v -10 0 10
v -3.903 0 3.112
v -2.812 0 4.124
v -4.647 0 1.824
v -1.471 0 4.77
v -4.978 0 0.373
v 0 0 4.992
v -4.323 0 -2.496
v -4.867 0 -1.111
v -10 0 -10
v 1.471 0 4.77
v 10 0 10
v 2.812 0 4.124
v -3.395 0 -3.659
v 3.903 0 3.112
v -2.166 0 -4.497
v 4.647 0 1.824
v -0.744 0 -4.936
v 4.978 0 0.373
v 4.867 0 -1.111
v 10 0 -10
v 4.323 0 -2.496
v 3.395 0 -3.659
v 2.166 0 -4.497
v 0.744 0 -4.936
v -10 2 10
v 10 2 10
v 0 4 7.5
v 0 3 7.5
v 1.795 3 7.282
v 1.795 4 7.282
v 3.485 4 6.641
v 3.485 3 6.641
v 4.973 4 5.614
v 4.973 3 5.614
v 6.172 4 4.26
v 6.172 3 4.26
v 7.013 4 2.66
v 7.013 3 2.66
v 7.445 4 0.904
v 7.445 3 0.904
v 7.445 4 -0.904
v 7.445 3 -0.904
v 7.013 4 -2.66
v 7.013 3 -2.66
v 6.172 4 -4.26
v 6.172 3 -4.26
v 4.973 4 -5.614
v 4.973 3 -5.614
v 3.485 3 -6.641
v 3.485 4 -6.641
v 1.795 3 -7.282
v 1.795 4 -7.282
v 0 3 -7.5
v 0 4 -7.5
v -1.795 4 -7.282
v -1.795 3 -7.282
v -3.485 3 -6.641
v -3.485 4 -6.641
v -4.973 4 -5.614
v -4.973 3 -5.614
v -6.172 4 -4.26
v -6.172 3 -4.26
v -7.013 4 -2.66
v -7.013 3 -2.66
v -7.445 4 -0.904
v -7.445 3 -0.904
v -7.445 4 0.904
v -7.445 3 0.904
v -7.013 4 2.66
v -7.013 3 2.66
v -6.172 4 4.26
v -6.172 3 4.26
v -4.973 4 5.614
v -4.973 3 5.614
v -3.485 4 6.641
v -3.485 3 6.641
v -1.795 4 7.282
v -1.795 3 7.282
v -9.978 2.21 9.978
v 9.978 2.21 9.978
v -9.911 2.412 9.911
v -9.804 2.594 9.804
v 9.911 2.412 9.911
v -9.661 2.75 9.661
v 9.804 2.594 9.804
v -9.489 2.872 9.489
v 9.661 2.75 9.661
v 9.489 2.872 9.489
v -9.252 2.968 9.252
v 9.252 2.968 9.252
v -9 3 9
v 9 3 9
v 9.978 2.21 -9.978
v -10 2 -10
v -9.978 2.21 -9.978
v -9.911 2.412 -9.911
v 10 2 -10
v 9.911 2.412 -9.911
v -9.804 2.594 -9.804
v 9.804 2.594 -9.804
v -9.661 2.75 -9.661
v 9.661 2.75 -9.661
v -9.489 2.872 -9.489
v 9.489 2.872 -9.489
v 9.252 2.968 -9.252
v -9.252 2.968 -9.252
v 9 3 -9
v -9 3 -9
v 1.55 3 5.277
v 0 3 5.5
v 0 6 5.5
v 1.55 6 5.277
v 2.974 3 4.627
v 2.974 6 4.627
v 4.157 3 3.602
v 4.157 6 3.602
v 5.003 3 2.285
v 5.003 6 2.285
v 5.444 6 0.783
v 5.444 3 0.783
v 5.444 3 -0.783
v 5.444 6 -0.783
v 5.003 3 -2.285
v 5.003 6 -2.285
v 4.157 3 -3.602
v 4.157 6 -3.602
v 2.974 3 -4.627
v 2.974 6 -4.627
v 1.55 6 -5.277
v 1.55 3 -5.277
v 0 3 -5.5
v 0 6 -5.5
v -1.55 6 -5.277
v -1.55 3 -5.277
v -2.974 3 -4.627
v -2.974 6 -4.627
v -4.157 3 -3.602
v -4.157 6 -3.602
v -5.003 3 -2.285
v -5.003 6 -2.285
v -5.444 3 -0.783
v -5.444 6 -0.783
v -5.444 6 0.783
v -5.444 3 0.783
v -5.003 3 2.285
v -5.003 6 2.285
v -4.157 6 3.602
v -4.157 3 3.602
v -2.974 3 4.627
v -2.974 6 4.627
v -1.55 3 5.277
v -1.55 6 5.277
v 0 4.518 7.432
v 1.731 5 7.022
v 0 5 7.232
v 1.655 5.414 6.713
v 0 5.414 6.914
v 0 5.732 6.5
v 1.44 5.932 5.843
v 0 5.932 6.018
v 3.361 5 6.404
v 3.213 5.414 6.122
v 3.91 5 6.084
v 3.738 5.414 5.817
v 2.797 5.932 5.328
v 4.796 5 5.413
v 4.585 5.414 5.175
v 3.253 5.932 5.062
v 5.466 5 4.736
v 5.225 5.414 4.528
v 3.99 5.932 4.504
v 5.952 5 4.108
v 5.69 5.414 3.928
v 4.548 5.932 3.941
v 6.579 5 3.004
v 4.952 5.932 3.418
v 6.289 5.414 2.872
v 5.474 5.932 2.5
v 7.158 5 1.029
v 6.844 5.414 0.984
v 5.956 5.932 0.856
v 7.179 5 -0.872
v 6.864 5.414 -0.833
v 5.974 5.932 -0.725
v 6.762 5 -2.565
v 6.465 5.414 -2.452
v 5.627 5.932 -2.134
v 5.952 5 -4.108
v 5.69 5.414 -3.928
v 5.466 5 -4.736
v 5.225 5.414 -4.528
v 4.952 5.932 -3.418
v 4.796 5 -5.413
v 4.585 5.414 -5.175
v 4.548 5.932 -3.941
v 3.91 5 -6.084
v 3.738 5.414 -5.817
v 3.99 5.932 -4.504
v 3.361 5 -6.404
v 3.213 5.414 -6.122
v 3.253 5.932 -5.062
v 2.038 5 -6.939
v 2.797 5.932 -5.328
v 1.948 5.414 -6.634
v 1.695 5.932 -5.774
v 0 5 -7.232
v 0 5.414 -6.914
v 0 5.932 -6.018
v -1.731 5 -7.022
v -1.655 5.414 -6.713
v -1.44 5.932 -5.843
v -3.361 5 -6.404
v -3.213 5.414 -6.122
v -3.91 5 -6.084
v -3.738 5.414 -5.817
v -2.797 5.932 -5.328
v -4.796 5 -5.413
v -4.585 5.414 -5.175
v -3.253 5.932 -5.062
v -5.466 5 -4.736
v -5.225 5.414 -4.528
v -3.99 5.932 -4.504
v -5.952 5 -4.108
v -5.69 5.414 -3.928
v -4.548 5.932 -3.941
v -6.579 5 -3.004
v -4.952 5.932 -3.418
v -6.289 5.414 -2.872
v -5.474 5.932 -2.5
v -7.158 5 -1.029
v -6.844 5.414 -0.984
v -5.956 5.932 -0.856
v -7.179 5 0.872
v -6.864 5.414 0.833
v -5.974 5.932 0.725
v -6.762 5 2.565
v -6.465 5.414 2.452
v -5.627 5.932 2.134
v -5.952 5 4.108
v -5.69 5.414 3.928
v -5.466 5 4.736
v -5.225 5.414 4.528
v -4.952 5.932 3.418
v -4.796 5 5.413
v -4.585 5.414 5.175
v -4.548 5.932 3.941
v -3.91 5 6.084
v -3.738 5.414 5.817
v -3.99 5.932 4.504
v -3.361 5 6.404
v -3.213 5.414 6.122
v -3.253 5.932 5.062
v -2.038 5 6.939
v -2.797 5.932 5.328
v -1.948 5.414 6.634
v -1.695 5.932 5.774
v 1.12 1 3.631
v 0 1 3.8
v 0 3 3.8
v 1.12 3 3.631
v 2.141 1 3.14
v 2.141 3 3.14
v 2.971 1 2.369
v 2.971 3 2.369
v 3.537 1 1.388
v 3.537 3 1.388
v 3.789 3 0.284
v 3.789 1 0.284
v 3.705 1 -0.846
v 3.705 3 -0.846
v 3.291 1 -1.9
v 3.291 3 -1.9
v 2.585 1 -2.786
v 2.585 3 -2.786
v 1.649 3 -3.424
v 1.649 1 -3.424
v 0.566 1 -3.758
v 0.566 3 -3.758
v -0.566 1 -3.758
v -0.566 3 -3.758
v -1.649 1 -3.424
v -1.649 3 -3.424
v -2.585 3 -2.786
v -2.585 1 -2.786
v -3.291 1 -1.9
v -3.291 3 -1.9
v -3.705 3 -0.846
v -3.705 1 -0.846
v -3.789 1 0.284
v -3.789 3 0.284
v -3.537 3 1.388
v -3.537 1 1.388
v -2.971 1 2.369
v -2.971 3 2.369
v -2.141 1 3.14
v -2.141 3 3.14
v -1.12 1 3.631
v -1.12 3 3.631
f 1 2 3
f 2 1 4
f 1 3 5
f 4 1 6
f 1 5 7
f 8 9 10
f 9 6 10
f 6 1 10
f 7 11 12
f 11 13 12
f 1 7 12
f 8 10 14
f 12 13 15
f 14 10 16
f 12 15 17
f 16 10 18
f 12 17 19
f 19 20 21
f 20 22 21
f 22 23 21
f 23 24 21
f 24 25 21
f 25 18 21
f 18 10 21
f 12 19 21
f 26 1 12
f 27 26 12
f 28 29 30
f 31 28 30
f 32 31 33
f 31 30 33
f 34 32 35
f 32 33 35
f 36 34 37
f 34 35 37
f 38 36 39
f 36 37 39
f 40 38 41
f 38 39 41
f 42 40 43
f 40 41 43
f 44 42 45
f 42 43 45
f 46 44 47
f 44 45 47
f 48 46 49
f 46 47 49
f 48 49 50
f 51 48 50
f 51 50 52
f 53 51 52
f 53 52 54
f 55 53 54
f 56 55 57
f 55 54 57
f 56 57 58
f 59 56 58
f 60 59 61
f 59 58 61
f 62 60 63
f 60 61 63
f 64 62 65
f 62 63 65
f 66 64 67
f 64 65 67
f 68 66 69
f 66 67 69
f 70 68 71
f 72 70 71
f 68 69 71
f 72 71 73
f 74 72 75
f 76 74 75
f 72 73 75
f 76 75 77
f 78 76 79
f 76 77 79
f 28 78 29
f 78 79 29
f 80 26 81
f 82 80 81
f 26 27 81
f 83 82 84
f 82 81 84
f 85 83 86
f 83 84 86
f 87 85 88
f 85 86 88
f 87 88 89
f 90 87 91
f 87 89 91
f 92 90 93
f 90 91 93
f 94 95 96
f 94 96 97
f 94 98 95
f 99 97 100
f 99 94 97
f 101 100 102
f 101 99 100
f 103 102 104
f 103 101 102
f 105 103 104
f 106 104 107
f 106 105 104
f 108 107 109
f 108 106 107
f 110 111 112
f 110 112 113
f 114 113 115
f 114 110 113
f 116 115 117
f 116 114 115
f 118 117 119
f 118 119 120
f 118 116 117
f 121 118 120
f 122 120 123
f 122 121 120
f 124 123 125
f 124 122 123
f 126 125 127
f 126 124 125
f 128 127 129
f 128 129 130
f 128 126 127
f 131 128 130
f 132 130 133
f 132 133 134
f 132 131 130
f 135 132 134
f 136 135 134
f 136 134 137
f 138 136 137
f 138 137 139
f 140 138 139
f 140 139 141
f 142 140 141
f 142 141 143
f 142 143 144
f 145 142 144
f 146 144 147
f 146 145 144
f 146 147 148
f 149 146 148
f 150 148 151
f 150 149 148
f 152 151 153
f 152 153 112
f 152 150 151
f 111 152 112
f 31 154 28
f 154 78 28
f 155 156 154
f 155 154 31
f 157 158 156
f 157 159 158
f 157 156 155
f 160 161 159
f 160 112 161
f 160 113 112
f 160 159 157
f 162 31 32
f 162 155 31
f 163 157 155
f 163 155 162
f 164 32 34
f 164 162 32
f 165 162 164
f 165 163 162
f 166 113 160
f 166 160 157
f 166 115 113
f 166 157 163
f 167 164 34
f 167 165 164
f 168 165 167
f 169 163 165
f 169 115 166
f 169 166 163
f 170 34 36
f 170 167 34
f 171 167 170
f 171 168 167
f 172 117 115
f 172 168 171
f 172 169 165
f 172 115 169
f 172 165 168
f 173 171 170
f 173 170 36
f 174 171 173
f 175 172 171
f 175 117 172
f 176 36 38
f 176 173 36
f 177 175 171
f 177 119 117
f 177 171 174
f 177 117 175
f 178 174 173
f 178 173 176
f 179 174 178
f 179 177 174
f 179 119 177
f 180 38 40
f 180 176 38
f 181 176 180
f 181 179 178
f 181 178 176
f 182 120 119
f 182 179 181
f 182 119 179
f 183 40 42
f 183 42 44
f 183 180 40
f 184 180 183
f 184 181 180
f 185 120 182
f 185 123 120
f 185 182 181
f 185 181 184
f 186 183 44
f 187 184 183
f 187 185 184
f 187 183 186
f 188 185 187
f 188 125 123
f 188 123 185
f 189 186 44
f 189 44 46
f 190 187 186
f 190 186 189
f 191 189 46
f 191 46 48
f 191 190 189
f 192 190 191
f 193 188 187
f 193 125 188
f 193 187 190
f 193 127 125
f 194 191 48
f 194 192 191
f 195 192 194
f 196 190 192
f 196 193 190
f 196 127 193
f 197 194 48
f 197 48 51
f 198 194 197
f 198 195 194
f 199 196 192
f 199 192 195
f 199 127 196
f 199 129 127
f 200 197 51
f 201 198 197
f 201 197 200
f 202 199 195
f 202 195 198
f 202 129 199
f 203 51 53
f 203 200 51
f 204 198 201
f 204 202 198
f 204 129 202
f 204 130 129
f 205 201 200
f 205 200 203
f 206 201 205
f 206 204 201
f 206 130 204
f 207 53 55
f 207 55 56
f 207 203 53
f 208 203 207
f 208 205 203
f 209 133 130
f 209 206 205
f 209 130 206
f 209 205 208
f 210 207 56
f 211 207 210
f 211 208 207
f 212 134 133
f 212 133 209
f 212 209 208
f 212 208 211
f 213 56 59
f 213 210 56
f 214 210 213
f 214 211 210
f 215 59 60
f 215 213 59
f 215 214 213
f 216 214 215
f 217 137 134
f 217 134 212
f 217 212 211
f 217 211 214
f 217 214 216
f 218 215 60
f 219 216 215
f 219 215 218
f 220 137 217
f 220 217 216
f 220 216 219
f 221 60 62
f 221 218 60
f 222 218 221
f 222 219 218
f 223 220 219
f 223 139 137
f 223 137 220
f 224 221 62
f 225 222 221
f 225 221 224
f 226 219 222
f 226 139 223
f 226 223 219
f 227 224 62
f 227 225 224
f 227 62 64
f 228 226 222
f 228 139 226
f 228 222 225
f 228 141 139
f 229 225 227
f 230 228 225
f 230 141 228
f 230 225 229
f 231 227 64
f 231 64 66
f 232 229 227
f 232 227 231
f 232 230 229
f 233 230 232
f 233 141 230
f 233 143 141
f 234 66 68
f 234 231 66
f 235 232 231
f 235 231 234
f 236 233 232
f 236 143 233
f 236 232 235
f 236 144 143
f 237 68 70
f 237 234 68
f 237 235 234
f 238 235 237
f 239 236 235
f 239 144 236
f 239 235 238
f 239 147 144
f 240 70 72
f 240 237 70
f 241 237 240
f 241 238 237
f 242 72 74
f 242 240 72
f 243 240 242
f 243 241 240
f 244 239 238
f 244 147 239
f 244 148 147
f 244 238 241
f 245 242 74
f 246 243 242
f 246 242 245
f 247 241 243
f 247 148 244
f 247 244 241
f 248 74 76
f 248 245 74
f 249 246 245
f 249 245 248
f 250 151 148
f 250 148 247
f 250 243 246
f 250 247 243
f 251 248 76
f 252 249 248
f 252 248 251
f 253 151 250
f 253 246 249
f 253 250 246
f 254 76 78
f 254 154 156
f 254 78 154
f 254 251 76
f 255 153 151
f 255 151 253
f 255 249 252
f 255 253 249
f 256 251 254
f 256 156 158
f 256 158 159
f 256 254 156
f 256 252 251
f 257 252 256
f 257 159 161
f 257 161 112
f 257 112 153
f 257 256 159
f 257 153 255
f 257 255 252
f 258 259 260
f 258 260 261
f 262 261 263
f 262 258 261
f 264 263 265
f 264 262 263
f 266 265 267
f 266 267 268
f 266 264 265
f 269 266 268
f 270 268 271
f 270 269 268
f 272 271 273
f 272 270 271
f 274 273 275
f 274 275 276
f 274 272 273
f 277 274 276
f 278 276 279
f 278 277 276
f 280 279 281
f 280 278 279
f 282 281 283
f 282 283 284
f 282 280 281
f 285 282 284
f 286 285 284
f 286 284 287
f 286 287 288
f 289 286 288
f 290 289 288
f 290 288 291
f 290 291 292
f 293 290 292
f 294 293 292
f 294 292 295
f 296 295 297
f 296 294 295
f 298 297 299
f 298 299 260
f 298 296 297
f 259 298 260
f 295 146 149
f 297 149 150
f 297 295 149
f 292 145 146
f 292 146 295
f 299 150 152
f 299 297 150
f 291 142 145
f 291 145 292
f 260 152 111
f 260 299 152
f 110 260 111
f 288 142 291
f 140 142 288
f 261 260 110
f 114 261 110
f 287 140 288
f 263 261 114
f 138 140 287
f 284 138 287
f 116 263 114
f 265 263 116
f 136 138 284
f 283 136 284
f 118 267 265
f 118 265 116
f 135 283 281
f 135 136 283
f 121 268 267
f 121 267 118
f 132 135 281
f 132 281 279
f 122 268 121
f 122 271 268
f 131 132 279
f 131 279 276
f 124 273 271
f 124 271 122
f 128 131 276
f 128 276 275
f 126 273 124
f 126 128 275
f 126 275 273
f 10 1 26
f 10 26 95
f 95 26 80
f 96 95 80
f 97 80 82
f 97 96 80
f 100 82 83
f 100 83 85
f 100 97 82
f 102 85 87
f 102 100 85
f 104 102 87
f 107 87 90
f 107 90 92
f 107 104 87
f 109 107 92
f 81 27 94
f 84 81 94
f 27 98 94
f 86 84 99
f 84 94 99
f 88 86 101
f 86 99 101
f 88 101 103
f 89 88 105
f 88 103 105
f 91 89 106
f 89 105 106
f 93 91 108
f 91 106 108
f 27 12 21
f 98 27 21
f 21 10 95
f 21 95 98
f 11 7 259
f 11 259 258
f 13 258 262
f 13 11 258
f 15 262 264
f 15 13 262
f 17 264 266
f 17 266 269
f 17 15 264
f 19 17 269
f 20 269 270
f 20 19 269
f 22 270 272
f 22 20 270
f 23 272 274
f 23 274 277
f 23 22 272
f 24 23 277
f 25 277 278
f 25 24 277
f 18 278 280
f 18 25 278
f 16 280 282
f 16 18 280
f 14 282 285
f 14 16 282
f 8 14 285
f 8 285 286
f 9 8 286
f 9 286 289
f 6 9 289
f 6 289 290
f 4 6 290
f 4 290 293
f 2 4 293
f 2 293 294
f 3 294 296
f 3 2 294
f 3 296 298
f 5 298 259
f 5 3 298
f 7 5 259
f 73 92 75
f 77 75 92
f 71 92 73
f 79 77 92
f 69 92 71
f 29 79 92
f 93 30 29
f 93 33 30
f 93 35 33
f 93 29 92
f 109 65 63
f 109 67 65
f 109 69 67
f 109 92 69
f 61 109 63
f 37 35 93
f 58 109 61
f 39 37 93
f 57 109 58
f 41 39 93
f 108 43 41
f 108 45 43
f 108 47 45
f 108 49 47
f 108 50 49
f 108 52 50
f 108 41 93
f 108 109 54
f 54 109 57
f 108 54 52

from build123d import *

# Parameters (mm, degrees)
SKETCH1_W           = 20
SKETCH1_H           = 20
SKETCH1_R           = 3.8
BOSS_EXTRUDE1_DEPTH = 3
FILLET1_R           = 1
CHAMFER1_SIZE       = 1
CHAMFER1_SIZE2      = 1.191753593
SKETCH2_R           = 7.5
SKETCH2_R_2         = 5.5
BOSS_EXTRUDE2_DEPTH = 3
FILLET2_R           = 2


with BuildPart() as part:
    # Sketch1 → Boss-Extrude1 (new body)
    with BuildSketch(Plane(origin=(0, 0, 0), x_dir=(1, 0, 0), z_dir=(0, 1, 0))):
        Rectangle(SKETCH1_W, SKETCH1_H)
        with Locations(Location((0, 0, 0), (0, 0, 270))):
            Circle(SKETCH1_R, mode=Mode.SUBTRACT)
    extrude(amount=BOSS_EXTRUDE1_DEPTH)

    # Fillet1
    fillet1_edges = [part.edges().sort_by_distance(p)[0] for p in [
        (10, 3, 0),
        (0, 3, -10),
        (-10, 3, 0),
        (0, 3, 10),
    ]]
    fillet(fillet1_edges, radius=FILLET1_R)

    # Chamfer1
    chamfer1_edges = [part.edges().sort_by_distance(p)[0] for p in [
        (0, 0, -3.8),
    ]]
    chamfer1_side = [part.faces().sort_by_distance(p)[0] for p in [
        (0, 1.5, -3.8),
    ]]
    chamfer(chamfer1_edges, length=CHAMFER1_SIZE, length2=CHAMFER1_SIZE2, reference=chamfer1_side[0])

    # Sketch2 → Boss-Extrude2 (add)
    with BuildSketch(Plane(origin=(0, 3, 0), x_dir=(1, 0, 0), z_dir=(0, 1, 0))):
        with Locations(Location((0, 0, 0), (0, 0, 270))):
            Circle(SKETCH2_R)
        with Locations(Location((0, 0, 0), (0, 0, 270))):
            Circle(SKETCH2_R_2, mode=Mode.SUBTRACT)
    extrude(amount=BOSS_EXTRUDE2_DEPTH)

    # Fillet2
    fillet2_edges = [part.edges().sort_by_distance(p)[0] for p in [
        (0, 6, -7.5),
    ]]
    fillet(fillet2_edges, radius=FILLET2_R - 0.0001)  # a hair under: the kernel refuses the full size


solid = part.part
